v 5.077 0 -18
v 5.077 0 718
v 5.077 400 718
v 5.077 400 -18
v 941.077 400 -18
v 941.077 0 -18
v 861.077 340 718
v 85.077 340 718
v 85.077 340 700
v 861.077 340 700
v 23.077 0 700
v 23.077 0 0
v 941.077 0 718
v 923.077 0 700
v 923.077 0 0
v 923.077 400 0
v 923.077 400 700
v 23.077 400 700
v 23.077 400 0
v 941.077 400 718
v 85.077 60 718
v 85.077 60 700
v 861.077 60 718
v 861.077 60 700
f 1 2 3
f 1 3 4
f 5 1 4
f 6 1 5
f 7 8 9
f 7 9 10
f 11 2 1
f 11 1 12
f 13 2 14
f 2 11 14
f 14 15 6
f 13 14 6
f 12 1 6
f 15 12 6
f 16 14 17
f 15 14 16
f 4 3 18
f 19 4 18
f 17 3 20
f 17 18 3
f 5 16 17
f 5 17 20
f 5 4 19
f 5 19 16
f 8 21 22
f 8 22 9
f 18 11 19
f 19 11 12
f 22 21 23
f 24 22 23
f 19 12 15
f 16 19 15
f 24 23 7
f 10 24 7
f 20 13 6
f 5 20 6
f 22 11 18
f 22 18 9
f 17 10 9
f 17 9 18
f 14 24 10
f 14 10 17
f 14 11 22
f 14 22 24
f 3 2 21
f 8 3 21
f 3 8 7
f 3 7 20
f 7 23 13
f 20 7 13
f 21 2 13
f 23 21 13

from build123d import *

# Parameters (mm, degrees)
SKETCH_1_W          = 936
SKETCH_1_H          = 736
SKETCH_1_W_2        = 900
SKETCH_1_H_2        = 700
EXTRUDE_1_DEPTH     = 400
SKETCH_2_W          = 776
SKETCH_2_H          = 280
CUT_EXTRUDE_1_DEPTH = 179


with BuildPart() as part:
    # 草图1 → 凸台-拉伸1 (new body)
    with BuildSketch(Plane(origin=(0, 0, 0), x_dir=(1, 0, 0), z_dir=(0, 1, 0))):
        with Locations((473.076923077, -350)):
            Rectangle(SKETCH_1_W, SKETCH_1_H)
        with Locations((473.076923077, -350)):
            Rectangle(SKETCH_1_W_2, SKETCH_1_H_2, mode=Mode.SUBTRACT)
    extrude(amount=EXTRUDE_1_DEPTH)

    # 草图2 → 切除-拉伸1 (cut)
    with BuildSketch(Plane.XY.offset(718)):
        with Locations((473.076923077, 200)):
            Rectangle(SKETCH_2_W, SKETCH_2_H)
    extrude(amount=-CUT_EXTRUDE_1_DEPTH, mode=Mode.SUBTRACT)


solid = part.part
